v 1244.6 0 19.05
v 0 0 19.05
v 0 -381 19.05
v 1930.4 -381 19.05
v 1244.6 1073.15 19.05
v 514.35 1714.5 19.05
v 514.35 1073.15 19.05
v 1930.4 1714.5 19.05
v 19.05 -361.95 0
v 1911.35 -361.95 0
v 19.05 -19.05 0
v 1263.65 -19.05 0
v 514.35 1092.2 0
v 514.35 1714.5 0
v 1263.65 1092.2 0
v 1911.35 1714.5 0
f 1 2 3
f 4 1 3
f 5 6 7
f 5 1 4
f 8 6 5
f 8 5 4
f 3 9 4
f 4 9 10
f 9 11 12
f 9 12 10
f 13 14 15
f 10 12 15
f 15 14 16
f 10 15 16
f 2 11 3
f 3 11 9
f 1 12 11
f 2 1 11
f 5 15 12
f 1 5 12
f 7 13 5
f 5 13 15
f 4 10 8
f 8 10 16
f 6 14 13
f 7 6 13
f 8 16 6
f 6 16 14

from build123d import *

# Parameters (mm, degrees)
F1_DEPTH = 19.05
F2_SIZE  = 19.04999


# Not quite as in the source:
# - a fillet or chamfer is up to 0.001 mm smaller than in the source, because OpenCascade refuses the exact size


with BuildPart() as f1:
    # F0 (on Top) → F1 (new body)
    with BuildSketch(Plane.XY):
        Polygon((1244.6, 0), (0, 0), (0, -381), (1930.4, -381), (1930.4, 1714.5), (514.35, 1714.5), (514.35, 1073.15), (1244.6, 1073.15), align=None)
    extrude(amount=F1_DEPTH)

    # F2 (size 19.05 in the source; OpenCascade refuses exactly that, so slightly less here)
    f2_edges = [f1.edges().sort_by_distance(p)[0] for p in [
        (965.2, -381, 0),
        (1930.4, 666.75, 0),
        (879.475, 1073.15, 0),
        (1244.6, 536.575, 0),
        (622.3, 0, 0),
        (0, -190.5, 0),
    ]]
    chamfer(f2_edges, length=F2_SIZE)


solid = f1.part
